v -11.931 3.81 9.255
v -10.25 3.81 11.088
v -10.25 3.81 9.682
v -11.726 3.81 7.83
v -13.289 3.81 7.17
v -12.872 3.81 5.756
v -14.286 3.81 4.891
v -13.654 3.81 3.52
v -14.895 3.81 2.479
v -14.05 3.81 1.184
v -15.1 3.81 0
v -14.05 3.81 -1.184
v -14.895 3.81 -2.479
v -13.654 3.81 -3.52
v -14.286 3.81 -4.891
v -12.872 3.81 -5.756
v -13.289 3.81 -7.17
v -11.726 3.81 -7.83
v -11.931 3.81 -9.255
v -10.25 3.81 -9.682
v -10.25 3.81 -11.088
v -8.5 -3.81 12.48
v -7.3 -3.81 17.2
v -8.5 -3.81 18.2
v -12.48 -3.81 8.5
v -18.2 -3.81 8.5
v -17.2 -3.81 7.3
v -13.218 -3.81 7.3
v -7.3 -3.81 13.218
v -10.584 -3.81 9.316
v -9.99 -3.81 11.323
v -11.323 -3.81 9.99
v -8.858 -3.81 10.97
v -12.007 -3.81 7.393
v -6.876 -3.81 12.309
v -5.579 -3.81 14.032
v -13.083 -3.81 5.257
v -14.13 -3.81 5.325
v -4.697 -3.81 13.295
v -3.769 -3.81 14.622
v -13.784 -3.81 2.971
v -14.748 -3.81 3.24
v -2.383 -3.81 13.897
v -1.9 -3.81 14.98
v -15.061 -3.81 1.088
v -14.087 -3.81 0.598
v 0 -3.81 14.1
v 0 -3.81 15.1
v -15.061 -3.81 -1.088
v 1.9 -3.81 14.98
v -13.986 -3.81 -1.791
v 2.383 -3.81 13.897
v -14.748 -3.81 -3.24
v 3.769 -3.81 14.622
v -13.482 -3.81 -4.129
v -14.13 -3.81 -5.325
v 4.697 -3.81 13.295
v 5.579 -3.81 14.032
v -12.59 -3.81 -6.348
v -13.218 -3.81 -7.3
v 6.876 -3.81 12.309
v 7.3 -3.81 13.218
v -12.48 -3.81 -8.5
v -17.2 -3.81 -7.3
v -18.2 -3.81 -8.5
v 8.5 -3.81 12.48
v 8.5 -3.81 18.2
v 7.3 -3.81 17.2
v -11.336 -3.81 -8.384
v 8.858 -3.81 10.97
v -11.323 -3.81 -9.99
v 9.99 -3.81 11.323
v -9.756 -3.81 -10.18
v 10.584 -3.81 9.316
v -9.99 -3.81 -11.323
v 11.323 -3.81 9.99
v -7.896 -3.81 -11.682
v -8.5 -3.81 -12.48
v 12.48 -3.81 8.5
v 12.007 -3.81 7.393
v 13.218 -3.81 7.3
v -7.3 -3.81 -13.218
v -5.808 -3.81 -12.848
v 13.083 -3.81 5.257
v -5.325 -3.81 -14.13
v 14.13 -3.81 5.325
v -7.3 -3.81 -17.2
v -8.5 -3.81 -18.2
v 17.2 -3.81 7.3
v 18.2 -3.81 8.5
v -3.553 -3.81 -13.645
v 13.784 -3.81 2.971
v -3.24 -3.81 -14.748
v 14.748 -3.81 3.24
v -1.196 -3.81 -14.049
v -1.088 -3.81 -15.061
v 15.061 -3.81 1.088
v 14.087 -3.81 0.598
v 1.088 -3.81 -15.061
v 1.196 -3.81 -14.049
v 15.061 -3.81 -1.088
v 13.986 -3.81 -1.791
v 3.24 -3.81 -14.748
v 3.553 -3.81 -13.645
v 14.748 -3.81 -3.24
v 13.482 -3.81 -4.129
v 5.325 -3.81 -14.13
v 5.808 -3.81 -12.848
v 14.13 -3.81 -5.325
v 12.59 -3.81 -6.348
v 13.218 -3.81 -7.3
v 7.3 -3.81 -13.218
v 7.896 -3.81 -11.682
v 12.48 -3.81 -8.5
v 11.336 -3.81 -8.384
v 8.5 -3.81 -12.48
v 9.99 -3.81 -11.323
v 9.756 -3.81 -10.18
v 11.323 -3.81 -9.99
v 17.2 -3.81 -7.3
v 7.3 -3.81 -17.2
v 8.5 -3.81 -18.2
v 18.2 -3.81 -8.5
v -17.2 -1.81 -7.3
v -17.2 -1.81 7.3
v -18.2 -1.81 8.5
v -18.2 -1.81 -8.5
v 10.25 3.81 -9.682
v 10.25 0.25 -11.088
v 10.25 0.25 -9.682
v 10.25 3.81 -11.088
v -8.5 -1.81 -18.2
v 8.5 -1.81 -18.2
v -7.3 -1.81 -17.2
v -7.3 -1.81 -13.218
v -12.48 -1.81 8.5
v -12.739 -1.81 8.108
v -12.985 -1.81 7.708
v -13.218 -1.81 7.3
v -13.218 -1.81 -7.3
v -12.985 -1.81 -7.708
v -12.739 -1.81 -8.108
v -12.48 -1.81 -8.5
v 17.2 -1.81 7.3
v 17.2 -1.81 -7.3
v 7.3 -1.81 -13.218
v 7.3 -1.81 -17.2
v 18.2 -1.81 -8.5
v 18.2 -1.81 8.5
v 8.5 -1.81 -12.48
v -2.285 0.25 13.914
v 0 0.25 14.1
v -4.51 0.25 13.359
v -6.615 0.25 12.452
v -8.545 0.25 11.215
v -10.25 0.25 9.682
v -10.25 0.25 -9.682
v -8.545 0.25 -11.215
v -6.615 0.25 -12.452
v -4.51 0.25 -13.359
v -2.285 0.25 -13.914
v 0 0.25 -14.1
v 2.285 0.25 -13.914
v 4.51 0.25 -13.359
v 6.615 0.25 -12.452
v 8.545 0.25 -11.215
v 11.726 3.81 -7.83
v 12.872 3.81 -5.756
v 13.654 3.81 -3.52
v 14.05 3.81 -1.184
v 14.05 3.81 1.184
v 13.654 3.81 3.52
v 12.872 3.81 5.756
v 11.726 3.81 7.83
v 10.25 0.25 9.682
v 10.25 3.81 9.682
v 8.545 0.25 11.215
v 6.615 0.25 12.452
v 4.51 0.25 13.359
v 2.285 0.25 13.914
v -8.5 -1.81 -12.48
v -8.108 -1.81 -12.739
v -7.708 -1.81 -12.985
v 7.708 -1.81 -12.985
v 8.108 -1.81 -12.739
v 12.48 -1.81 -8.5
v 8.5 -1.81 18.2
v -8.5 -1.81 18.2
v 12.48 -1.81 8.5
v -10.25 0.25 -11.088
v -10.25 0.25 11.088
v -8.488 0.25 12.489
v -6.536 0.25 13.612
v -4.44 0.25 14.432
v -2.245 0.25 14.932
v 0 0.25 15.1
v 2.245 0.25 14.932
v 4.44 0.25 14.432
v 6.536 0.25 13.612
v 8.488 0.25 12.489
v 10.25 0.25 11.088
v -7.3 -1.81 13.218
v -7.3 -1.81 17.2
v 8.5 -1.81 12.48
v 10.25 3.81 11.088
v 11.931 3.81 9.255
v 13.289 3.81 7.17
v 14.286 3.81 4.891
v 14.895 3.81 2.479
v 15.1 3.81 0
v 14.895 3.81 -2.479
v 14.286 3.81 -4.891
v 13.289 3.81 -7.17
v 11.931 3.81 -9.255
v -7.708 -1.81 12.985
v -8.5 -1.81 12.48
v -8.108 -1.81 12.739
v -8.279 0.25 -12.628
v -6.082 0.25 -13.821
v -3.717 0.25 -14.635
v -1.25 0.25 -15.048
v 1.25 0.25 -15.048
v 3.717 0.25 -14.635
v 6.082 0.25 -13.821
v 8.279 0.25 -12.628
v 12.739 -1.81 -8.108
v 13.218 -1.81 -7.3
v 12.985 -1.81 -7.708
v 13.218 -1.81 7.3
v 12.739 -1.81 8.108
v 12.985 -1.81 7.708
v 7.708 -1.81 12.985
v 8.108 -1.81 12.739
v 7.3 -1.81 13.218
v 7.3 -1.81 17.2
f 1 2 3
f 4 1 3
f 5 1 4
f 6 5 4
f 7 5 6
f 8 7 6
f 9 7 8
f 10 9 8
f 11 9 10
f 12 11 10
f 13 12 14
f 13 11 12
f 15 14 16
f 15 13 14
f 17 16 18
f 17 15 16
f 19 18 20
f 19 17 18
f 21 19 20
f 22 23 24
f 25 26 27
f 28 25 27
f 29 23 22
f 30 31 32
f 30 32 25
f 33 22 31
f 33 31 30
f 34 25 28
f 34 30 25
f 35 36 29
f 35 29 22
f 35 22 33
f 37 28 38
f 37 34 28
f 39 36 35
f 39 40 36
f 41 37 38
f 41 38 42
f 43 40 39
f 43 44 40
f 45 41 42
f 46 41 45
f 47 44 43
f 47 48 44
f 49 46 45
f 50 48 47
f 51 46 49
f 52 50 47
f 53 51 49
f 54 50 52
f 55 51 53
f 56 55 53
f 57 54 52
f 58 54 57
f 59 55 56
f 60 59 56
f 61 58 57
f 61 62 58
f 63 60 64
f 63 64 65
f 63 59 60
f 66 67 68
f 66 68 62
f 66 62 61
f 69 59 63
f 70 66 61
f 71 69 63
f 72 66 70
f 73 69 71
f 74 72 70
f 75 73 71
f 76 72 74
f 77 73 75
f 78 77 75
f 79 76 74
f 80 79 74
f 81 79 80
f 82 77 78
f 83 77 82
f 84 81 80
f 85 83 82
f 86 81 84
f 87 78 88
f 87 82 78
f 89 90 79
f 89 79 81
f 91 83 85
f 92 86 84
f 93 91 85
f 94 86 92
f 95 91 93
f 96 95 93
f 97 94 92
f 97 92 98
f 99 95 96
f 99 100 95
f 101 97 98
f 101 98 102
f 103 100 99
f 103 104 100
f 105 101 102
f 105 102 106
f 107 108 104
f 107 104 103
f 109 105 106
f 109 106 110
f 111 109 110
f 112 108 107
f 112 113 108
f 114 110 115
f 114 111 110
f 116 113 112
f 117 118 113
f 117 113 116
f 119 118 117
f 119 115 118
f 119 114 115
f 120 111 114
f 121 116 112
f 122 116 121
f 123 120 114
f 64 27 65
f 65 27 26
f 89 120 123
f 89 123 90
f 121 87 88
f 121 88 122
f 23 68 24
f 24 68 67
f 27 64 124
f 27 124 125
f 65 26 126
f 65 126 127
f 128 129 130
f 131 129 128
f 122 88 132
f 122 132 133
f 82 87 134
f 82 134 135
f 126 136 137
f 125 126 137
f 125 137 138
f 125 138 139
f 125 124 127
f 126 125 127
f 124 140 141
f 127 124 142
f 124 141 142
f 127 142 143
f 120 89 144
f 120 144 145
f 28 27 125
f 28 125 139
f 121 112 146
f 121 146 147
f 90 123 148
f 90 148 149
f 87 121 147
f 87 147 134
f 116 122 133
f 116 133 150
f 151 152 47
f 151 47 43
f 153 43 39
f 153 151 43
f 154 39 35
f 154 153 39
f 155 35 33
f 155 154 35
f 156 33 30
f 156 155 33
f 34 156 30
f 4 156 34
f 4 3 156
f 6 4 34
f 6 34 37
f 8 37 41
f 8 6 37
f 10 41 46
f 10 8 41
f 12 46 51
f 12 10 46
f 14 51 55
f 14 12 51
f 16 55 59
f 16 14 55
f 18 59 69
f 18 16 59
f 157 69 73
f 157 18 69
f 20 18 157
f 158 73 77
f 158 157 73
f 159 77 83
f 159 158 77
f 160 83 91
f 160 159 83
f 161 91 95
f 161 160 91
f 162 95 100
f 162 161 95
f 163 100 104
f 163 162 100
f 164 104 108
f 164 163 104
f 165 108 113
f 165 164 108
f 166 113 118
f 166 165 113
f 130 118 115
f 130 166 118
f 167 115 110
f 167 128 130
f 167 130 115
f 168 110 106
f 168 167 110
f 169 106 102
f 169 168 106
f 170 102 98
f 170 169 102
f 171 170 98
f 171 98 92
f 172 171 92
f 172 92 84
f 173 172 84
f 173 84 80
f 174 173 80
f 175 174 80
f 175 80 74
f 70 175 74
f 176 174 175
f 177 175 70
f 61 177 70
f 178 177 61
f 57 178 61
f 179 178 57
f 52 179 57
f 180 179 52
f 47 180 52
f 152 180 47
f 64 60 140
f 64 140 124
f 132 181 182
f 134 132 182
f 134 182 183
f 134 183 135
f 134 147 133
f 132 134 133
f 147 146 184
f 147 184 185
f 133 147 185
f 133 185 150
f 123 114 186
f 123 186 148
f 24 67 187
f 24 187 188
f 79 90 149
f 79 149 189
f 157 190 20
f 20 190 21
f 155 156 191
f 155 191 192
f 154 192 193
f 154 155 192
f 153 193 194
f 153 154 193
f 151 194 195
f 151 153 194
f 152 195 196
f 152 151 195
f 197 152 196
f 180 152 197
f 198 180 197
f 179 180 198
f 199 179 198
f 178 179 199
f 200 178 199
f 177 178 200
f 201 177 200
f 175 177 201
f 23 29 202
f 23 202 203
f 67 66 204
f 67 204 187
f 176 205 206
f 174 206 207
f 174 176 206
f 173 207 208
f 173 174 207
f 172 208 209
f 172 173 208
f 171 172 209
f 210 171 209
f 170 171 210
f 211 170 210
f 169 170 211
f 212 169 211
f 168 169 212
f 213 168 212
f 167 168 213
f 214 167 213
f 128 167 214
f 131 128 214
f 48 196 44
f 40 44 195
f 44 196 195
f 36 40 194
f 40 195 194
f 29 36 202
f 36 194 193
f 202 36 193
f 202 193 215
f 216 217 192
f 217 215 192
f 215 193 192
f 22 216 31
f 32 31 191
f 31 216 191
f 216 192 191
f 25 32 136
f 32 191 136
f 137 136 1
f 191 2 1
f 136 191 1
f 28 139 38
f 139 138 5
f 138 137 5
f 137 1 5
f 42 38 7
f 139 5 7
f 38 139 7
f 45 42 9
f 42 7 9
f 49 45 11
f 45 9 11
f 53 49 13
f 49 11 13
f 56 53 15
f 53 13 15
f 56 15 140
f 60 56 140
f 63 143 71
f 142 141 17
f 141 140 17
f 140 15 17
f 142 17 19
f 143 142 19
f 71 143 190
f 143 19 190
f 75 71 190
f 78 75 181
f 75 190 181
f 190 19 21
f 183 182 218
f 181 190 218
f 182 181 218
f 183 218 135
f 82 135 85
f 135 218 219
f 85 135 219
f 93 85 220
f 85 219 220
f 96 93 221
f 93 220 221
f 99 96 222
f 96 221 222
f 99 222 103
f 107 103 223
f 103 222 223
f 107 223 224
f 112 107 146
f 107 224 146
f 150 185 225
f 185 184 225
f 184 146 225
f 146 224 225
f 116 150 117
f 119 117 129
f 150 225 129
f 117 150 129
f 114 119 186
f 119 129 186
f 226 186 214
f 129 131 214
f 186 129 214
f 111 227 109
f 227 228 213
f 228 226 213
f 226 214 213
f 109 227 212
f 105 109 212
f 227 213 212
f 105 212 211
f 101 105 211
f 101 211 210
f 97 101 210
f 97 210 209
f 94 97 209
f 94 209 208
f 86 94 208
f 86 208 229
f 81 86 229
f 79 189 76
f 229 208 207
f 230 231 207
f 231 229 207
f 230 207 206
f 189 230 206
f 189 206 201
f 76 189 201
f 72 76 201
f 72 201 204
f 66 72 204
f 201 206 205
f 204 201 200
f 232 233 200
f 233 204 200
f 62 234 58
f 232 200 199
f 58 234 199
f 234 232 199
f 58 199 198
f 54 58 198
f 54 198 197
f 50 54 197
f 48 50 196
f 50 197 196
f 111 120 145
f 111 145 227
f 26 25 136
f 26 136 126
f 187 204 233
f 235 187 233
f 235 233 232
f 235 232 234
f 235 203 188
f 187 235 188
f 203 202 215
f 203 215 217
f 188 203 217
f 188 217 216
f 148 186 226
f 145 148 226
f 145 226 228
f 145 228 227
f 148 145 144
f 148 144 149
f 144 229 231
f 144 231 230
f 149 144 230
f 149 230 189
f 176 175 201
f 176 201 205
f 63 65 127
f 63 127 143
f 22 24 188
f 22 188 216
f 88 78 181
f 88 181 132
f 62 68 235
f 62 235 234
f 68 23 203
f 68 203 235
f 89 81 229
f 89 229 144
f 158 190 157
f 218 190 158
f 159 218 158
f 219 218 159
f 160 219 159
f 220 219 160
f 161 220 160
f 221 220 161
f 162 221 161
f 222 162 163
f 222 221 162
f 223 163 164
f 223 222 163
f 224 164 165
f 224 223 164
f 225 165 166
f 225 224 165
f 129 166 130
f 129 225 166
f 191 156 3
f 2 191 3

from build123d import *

# Parameters (mm, degrees)
CROQUIS1_W                 = 1
CROQUIS1_H                 = 7.62
SALIENTE_EXTRUIR1_START    = -3.81
SALIENTE_EXTRUIR1_DEPTH    = 2
MATRIZC1_COUNT             = 4
CORTAR_EXTRUIR1_DEPTH      = 27.019148718
CORTAR_EXTRUIR1_DEPTH_BACK = 27.019148718
CROQUIS4_W                 = 20.5
CROQUIS4_H                 = 3.56


with BuildPart() as part:
    # Croquis1 → Revolución1 (revolve)
    with BuildSketch(Plane.XY, mode=Mode.PRIVATE) as revoluci_n1_sk:
        with Locations((14.6, 0)):
            Rectangle(CROQUIS1_W, CROQUIS1_H)
    revolve(revoluci_n1_sk.sketch.rotate(Axis((0, 5.941666667, 0), (0, -1, 0)), 90), axis=Axis((0, 5.941666667, 0), (0, -1, 0)))

    # Croquis2 → Saliente-Extruir1 (add)
    with BuildSketch(Plane(origin=(0, 0, 0), x_dir=(1, 0, 0), z_dir=(0, 1, 0)).offset(SALIENTE_EXTRUIR1_START)):
        Polygon((8.5, -18.2), (-8.5, -18.2), (-8.5, -12.480384609), (-7.3, -12.480384609), (-7.3, -17.2), (7.3, -17.2), (7.3, -12.480384609), (8.5, -12.480384609), align=None)
    saliente_extruir1 = extrude(amount=SALIENTE_EXTRUIR1_DEPTH)

    # MatrizC1: Saliente-Extruir1 ×4 about axis
    matrizc1_axis = Axis((0, 0, 0), (0, 1, 0))
    for i in range(1, MATRIZC1_COUNT):
        add(saliente_extruir1.rotate(matrizc1_axis, i * 360 / MATRIZC1_COUNT))

    # Croquis4 → Cortar-Extruir1 (cut, two sides: drawn at the far end of the back side and taken through both)
    with BuildSketch(Plane.XY.offset(-CORTAR_EXTRUIR1_DEPTH_BACK)):
        with Locations((0, 2.03)):
            Rectangle(CROQUIS4_W, CROQUIS4_H)
    extrude(amount=CORTAR_EXTRUIR1_DEPTH + CORTAR_EXTRUIR1_DEPTH_BACK, mode=Mode.SUBTRACT)


solid = part.part
